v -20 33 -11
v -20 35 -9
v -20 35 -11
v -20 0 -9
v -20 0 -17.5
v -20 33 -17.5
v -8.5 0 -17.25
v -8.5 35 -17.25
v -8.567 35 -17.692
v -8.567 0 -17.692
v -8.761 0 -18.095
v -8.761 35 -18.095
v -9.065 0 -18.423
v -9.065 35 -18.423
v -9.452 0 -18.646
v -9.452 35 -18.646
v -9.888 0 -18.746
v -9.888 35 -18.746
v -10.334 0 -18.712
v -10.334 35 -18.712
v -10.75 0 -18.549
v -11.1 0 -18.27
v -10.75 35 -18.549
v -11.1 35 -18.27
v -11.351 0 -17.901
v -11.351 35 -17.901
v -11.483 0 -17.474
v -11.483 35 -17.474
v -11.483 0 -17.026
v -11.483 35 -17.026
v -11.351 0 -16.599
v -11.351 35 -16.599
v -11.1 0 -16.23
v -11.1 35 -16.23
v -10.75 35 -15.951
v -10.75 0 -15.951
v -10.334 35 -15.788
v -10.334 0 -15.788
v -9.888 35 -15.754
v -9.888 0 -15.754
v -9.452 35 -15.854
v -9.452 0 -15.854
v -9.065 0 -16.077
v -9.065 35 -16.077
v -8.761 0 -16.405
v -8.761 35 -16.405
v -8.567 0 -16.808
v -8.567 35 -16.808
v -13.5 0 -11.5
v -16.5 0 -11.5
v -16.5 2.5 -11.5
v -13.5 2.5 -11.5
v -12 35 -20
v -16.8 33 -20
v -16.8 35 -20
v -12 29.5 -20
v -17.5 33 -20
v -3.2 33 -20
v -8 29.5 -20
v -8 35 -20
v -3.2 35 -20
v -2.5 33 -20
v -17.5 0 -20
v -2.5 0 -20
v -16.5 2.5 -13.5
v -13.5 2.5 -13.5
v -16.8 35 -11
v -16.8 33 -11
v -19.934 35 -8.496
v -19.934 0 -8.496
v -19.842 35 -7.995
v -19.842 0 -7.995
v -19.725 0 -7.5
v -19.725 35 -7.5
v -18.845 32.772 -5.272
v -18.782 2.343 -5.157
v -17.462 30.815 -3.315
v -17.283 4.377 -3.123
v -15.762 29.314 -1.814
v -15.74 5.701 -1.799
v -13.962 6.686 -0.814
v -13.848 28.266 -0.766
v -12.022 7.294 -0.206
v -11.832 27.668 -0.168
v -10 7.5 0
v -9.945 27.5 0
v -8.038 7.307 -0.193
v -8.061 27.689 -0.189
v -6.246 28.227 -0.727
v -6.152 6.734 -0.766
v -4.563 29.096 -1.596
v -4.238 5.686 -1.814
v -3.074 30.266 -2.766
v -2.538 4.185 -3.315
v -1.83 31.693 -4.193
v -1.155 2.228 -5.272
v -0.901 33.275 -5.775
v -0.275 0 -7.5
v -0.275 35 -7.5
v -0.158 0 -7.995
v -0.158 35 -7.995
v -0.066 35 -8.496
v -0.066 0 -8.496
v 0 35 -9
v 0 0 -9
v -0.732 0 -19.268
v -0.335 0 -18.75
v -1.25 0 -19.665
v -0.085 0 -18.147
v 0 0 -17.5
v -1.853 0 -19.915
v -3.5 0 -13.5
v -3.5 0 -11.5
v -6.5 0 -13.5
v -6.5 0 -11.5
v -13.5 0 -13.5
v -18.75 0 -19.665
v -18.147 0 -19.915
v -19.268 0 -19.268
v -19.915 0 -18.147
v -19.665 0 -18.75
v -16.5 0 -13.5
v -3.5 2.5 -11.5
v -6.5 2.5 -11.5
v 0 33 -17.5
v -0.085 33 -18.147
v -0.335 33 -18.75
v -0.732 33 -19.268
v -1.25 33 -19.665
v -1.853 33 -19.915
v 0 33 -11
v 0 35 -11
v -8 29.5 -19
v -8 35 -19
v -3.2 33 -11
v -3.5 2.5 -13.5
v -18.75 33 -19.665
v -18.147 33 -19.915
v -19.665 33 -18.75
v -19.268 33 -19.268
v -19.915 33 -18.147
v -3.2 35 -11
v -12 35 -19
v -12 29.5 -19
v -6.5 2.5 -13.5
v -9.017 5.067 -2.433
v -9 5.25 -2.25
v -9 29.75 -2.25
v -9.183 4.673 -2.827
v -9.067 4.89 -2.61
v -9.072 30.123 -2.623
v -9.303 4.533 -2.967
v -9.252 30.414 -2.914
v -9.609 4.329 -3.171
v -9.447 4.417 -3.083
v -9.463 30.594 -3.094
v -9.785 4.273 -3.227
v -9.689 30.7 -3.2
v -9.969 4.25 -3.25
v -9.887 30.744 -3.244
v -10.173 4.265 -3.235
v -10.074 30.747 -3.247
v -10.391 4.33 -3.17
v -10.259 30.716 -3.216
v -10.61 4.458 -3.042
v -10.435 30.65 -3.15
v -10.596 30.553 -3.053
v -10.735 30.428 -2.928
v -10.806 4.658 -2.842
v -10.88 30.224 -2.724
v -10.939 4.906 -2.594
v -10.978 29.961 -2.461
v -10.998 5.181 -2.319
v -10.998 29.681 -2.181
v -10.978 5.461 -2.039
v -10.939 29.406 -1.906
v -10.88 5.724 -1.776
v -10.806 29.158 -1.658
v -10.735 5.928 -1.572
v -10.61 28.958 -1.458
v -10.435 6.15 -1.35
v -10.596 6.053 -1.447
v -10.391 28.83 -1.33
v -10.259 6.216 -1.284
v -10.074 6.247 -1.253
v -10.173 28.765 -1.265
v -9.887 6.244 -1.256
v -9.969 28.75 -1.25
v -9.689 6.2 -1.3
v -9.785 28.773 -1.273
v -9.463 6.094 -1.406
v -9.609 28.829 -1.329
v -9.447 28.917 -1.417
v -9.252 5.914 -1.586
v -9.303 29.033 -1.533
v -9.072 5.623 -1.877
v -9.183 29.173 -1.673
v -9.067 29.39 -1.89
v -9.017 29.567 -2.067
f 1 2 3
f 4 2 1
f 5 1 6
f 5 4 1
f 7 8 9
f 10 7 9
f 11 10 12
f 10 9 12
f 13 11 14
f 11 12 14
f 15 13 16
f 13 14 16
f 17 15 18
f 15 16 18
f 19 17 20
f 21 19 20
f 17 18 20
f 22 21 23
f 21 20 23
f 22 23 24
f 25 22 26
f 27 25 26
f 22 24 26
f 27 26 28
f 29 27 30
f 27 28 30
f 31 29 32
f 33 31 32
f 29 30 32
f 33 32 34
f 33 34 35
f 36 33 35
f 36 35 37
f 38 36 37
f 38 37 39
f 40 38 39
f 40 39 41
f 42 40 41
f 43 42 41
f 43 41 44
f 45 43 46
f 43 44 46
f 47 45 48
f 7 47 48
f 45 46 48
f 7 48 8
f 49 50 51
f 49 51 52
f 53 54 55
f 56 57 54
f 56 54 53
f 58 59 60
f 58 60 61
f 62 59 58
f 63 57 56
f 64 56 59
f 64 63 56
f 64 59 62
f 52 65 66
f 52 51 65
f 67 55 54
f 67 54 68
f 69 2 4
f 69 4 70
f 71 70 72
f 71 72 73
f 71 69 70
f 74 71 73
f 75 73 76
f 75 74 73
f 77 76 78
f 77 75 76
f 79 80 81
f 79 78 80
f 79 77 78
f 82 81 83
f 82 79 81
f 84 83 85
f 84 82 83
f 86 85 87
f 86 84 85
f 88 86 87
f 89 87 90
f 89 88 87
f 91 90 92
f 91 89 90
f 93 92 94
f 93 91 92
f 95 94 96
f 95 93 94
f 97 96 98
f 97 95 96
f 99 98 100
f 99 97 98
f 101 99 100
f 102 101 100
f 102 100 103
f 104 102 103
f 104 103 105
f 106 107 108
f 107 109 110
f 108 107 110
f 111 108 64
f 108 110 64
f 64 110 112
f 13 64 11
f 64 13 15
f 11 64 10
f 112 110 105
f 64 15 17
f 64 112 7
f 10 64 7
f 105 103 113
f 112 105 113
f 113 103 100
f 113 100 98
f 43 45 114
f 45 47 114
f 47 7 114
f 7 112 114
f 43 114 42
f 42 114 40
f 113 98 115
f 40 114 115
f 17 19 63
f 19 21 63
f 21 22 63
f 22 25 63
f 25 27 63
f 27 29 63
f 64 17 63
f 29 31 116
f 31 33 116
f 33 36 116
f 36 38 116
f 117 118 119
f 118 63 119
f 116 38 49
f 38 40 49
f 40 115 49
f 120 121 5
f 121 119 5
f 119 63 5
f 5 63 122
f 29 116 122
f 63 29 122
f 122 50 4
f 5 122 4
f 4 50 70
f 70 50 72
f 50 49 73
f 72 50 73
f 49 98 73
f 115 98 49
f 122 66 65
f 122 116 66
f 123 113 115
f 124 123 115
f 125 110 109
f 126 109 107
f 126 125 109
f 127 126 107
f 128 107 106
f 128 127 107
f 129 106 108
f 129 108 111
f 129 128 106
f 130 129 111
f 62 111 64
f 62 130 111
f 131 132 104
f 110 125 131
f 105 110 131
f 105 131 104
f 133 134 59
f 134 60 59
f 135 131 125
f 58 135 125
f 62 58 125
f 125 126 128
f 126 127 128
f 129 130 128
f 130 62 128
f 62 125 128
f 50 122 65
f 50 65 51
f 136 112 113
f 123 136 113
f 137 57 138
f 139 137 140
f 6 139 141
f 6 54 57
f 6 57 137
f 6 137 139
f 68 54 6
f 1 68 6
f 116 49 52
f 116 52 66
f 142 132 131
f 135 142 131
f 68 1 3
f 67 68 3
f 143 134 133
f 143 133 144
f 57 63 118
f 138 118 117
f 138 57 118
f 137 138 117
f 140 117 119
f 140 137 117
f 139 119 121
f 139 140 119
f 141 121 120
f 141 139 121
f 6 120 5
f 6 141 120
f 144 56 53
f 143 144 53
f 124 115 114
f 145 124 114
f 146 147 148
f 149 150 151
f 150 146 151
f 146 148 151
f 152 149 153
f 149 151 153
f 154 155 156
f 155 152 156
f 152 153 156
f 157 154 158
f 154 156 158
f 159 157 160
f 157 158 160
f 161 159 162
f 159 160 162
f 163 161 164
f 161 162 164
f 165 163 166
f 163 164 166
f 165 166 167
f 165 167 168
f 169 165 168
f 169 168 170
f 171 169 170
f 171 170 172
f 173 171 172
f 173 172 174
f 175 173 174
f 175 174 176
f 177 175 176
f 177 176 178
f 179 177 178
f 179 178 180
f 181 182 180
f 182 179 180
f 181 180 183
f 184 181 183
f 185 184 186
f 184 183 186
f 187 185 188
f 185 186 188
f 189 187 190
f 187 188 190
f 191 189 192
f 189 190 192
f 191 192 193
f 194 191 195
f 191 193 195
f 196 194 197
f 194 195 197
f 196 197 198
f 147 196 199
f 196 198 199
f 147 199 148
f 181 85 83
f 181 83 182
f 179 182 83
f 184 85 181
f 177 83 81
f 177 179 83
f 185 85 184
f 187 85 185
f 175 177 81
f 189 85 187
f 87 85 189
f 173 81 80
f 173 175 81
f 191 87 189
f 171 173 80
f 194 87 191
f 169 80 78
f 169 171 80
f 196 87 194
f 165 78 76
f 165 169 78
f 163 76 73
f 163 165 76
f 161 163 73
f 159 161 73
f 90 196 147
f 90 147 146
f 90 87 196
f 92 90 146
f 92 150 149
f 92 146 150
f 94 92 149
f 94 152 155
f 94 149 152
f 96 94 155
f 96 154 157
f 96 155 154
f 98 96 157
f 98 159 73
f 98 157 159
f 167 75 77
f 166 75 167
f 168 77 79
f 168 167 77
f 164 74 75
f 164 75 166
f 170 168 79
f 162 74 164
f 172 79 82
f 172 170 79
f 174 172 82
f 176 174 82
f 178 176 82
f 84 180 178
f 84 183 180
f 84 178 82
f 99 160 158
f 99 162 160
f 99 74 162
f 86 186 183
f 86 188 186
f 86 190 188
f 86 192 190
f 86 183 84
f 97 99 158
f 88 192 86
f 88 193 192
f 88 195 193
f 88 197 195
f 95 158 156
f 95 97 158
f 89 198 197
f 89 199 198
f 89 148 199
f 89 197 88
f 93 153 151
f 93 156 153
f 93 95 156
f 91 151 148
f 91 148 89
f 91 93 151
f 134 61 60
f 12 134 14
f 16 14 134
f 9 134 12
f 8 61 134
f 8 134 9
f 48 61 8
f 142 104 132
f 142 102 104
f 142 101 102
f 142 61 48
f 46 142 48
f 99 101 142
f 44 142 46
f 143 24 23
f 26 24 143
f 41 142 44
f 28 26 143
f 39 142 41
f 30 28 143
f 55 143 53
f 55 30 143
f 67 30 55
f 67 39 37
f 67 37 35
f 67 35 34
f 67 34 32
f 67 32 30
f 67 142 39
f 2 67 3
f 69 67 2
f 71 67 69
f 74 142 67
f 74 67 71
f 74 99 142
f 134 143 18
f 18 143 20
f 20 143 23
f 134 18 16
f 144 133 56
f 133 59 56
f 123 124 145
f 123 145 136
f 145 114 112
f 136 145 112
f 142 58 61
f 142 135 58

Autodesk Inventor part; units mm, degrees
sketch "Sketch1" plane through (0, 0, 0) normal (0, 1, 0) x (-1, 0, 0)
  line L0 (0, 0) -> (20, 0)
  line L1 (20, 0) -> (20, -20)
  line L2 (20, -20) -> (0, -20)
  line L3 (0, -20) -> (0, 0)
  dimension "d0" = 20
  dimension "d1" = 20
extrude "Extrusion1" add sketch "Sketch1" along normal blind 35
sketch "Sketch3" plane through (0, 0, 0) normal (1, 0, 0) x (0, 0, -1)
  line L0 (0, 35) -> (20, 35) projected
  line L1 (20, 35) -> (0, 35) projected
  line L2 (20, 35) -> (12.5, 35)
  line L3 (12.5, 35) -> (14, 35)
  line L4 (12.5, 35) -> (11, 35)
  line L5 (14, 35) -> (18.5, 35)
  line L6 (18.5, 35) -> (18.5, 33)
  line L7 (18.5, 33) -> (14, 35)
  line L8 (11, 35) -> (6.5, 35)
  line L9 (6.5, 35) -> (6.5, 33)
  line L10 (6.5, 33) -> (11, 35)
  line L11 (6.5, 33) -> (18.5, 33)
  line L12 (11, 35) -> (11, 33)
  line L13 (14, 35) -> (14, 33)
  point P0 (0, 0)
  dimension "d55" = 7.5
  dimension "d56" = 1.5
  dimension "d57" = 1.5
  dimension "d58" = 4.5
  dimension "d59" = 2
  dimension "d60" = 4.5
  dimension "d61" = 2
extrude "Extrusion3" cut sketch "Sketch3" against normal blind 3.2 contours L0 L13 L11 L12
sketch "Sketch9" plane through (0, 33, -14) normal (0, 0, 1) x (1, 0, 0)
  line L0 (0, 0) -> (-3.2, 0) projected
  line L1 (-3.2, 2) -> (0, 2) projected
  line L2 (0, 0) -> (-3.2, 0)
  line L3 (-3.2, 0) -> (-3.2, 2)
  line L4 (-3.2, 2) -> (0, 2)
  line L5 (0, 2) -> (0, 0)
  point P0 (0, -33)
extrude "Extrusion9" cut sketch "Sketch9" against normal up to surface (6 mm away)
ref_plane "Work Plane1" through (-10, 35, -20) normal (-1, 0, 0) x (0, -1, 0)
sketch "Sketch4" plane through (0, 0, 0) normal (0, -1, 0) x (1, 0, 0)
  line L0 (-20, 0) -> (0, 0) projected
  line L1 (0, -20) -> (-20, -20) projected
  line L2 (0, -20) -> (-20, -20) projected
  line L3 (0, -20) -> (-3.5, -20)
  line L4 (-3.5, -20) -> (-3.5, -13.5)
  line L5 (-3.5, -13.5) -> (-3.5, -11.5)
  line L6 (-3.5, -11.5) -> (-6.5, -11.5)
  line L7 (-6.5, -11.5) -> (-6.5, -13.5)
  line L8 (-6.5, -13.5) -> (-3.5, -13.5)
  line L9 (-10, -20) -> (-10, 0)
  line L10 (-20, 0) -> (0, 0) projected
  line L11 (-16.5, -13.5) -> (-16.5, -11.5)
  line L12 (-16.5, -11.5) -> (-13.5, -11.5)
  line L13 (-13.5, -11.5) -> (-13.5, -13.5)
  line L14 (-13.5, -13.5) -> (-16.5, -13.5)
  dimension "d62" = 3.5
  dimension "d63" = 6.5
  dimension "d64" = 2
  dimension "d65" = 3
  dimension "d66" = 2
extrude "Extrusion4" cut sketch "Sketch4" against normal blind 2.5
fillet "Fillet3" radius 2.5 4 edges at (0, 17.5, 0) (-20, 17.5, 0) (-20, 17.5, -20) (0, 16.5, -20)
sketch "Sketch6" plane through (0, 35, 0) normal (0, 1, 0) x (1, 0, 0)
  line L0 (-2, 0) -> (-18, 0) projected
  line L1 (-10, 0) -> (-10, 20)
  line L2 (-18, 20) -> (-2, 20) projected
  line L3 (-10, 0) -> (-10, 1.25)
  circle A0 centre (-10, 10) radius 8.75
  line L4 (-10, 1.25) -> (-11, 1.25)
  line L5 (-10, 1.25) -> (-9, 1.25)
  line L6 (-10, 1.25) -> (-9, 1.25) construction
  line L7 (-9, 1.25) -> (-9, 20)
  line L8 (-2, 20) -> (-18, 20) projected
  line L9 (-9, 20) -> (-11, 20)
  line L10 (-11, 20) -> (-11, 1.25)
  circle A1 centre (-10, 17.25) radius 1.5
  circle A2 centre (-10, 2.25) radius 1
  point P0 (0, 0)
  point P1 (-11, 18.6927)
  point P2 (-11, 1.3073)
  point P3 (-9, 1.3073)
  point P4 (-9, 18.6927)
  dimension "d40" = 1.25
  dimension "d41" = 1
  dimension "d42" = 1
  dimension "d43" = 0
  dimension "d44" = 90
  dimension "d45" = 2
  dimension "d69" = 3
  dimension "d70" = 2
  dimension "d71" = 0
  dimension "d72" = 0
  dimension "d73" = 0
ref_plane "Work Plane2" through (0, 2, -2) normal (1, 0, 0) x (0, 0, -1)
sketch "Sketch7" plane through (0, 2, -2) normal (1, 0, 0) x (0, 0, -1)
  line L0 (-2, -2) -> (-2, 5.5)
  line L1 (-2, -2) -> (-2, 33) projected
  line L2 (-2, 5.5) -> (5.5, -2)
  line L3 (5.5, -2) -> (-2, -2)
  line L4 (7, -2) -> (7, 0.2) projected
  point P0 (-2, 0)
  point P1 (-2, 31)
  dimension "d36" = 7.5
  dimension "d37" = 45
extrude "Extrusion6" cut sketch "Sketch7" against normal up to surface (20 mm away)
extrude "Extrusion7" cut sketch "Sketch6" against normal up to surface (35 mm away) contours A2 L1 | L1 A2 | A1 L10 L1 | L1 A1 L7 | L7 A1 | A1 L10
sketch "Sketch8" plane through (0, 35, 0) normal (0, 1, 0) x (1, 0, 0)
  line L0 (-9, 18.6927) -> (-9, 1.3073) projected
  line L1 (-11, 1.3073) -> (-11, 18.6927) projected
  arc A0 (-11, 1.3073) -> (-9, 1.3073) centre (-10, 10) ccw projected
  arc A1 (-9, 18.6927) -> (-11, 18.6927) centre (-10, 10) ccw projected
  circle A2 centre (-10, 10) radius 8.75
  line L2 (-3.2, 11) -> (0, 11) projected
  line L3 (-20, 11) -> (-16.8, 11) projected
  line L4 (-16.8, 9) -> (-20, 9) projected
  line L5 (0, 9) -> (-3.2, 9) projected
  arc A3 (-20, 9) -> (0, 9) centre (-10, 10.0556) ccw
  line L6 (-3.2, 20) -> (-17.5, 20) projected
  arc A4 (-17.5, 20) -> (-20, 17.5) centre (-17.5, 17.5) ccw projected
  line L7 (-20, 17.5) -> (-20, 2.5) projected
  arc A5 (-20, 2.5) -> (-17.5, 0) centre (-17.5, 2.5) ccw projected
  line L8 (-17.5, 0) -> (-2.5, 0) projected
  arc A6 (-2.5, 0) -> (0, 2.5) centre (-2.5, 2.5) ccw projected
  line L9 (0, 2.5) -> (0, 11) projected
  line L10 (0, 11) -> (-3.2, 11) projected
  line L11 (-3.2, 11) -> (-3.2, 20) projected
  point P0 (0, 0)
  point P1 (-10, 0)
  dimension "d51" = 17.5
extrude "Extrusion8" cut sketch "Sketch8" against normal up to surface (35 mm away) contours L9 A6 L8 A3 | A3 L8 A5 L7
mirror "Mirror2" about plane through (-10, 35, -20) normal (-1, 0, 0) of "Extrusion3", "Extrusion9"
ref_plane "Work Plane3" through (-20, 17.5, -9) normal (0, 1, 0) x (-1, 0, 0)
mirror "Mirror3" about plane through (-20, 17.5, -9) normal (0, 1, 0) of "Extrusion6"
sketch "Sketch11" plane through (-3.2, 33, -20) normal (0, 0, -1) x (-1, 0, 0)
  line L0 (0, 2) -> (13.6, 2) projected
  line L1 (5.3, 2) -> (8.3, 2) projected
  line L2 (6.8, 2) -> (12.3, 2) construction
  line L3 (8.8, 2) -> (4.8, 2)
  line L4 (4.8, 2) -> (4.8, -3.5)
  line L5 (4.8, -3.5) -> (8.8, -3.5)
  line L6 (8.8, -3.5) -> (8.8, 2)
  point P0 (-3.2, -33)
  point P1 (6.8, 2)
  point P2 (6.8, 2)
  point P3 (4.8, 2)
  dimension "d76" = 4
  dimension "d77" = 5.5
  dimension "d78" = 0
  dimension "d79" = 0
extrude "Extrusion10" cut sketch "Sketch11" against normal blind 1
properties part number "BaseKnuckle"
